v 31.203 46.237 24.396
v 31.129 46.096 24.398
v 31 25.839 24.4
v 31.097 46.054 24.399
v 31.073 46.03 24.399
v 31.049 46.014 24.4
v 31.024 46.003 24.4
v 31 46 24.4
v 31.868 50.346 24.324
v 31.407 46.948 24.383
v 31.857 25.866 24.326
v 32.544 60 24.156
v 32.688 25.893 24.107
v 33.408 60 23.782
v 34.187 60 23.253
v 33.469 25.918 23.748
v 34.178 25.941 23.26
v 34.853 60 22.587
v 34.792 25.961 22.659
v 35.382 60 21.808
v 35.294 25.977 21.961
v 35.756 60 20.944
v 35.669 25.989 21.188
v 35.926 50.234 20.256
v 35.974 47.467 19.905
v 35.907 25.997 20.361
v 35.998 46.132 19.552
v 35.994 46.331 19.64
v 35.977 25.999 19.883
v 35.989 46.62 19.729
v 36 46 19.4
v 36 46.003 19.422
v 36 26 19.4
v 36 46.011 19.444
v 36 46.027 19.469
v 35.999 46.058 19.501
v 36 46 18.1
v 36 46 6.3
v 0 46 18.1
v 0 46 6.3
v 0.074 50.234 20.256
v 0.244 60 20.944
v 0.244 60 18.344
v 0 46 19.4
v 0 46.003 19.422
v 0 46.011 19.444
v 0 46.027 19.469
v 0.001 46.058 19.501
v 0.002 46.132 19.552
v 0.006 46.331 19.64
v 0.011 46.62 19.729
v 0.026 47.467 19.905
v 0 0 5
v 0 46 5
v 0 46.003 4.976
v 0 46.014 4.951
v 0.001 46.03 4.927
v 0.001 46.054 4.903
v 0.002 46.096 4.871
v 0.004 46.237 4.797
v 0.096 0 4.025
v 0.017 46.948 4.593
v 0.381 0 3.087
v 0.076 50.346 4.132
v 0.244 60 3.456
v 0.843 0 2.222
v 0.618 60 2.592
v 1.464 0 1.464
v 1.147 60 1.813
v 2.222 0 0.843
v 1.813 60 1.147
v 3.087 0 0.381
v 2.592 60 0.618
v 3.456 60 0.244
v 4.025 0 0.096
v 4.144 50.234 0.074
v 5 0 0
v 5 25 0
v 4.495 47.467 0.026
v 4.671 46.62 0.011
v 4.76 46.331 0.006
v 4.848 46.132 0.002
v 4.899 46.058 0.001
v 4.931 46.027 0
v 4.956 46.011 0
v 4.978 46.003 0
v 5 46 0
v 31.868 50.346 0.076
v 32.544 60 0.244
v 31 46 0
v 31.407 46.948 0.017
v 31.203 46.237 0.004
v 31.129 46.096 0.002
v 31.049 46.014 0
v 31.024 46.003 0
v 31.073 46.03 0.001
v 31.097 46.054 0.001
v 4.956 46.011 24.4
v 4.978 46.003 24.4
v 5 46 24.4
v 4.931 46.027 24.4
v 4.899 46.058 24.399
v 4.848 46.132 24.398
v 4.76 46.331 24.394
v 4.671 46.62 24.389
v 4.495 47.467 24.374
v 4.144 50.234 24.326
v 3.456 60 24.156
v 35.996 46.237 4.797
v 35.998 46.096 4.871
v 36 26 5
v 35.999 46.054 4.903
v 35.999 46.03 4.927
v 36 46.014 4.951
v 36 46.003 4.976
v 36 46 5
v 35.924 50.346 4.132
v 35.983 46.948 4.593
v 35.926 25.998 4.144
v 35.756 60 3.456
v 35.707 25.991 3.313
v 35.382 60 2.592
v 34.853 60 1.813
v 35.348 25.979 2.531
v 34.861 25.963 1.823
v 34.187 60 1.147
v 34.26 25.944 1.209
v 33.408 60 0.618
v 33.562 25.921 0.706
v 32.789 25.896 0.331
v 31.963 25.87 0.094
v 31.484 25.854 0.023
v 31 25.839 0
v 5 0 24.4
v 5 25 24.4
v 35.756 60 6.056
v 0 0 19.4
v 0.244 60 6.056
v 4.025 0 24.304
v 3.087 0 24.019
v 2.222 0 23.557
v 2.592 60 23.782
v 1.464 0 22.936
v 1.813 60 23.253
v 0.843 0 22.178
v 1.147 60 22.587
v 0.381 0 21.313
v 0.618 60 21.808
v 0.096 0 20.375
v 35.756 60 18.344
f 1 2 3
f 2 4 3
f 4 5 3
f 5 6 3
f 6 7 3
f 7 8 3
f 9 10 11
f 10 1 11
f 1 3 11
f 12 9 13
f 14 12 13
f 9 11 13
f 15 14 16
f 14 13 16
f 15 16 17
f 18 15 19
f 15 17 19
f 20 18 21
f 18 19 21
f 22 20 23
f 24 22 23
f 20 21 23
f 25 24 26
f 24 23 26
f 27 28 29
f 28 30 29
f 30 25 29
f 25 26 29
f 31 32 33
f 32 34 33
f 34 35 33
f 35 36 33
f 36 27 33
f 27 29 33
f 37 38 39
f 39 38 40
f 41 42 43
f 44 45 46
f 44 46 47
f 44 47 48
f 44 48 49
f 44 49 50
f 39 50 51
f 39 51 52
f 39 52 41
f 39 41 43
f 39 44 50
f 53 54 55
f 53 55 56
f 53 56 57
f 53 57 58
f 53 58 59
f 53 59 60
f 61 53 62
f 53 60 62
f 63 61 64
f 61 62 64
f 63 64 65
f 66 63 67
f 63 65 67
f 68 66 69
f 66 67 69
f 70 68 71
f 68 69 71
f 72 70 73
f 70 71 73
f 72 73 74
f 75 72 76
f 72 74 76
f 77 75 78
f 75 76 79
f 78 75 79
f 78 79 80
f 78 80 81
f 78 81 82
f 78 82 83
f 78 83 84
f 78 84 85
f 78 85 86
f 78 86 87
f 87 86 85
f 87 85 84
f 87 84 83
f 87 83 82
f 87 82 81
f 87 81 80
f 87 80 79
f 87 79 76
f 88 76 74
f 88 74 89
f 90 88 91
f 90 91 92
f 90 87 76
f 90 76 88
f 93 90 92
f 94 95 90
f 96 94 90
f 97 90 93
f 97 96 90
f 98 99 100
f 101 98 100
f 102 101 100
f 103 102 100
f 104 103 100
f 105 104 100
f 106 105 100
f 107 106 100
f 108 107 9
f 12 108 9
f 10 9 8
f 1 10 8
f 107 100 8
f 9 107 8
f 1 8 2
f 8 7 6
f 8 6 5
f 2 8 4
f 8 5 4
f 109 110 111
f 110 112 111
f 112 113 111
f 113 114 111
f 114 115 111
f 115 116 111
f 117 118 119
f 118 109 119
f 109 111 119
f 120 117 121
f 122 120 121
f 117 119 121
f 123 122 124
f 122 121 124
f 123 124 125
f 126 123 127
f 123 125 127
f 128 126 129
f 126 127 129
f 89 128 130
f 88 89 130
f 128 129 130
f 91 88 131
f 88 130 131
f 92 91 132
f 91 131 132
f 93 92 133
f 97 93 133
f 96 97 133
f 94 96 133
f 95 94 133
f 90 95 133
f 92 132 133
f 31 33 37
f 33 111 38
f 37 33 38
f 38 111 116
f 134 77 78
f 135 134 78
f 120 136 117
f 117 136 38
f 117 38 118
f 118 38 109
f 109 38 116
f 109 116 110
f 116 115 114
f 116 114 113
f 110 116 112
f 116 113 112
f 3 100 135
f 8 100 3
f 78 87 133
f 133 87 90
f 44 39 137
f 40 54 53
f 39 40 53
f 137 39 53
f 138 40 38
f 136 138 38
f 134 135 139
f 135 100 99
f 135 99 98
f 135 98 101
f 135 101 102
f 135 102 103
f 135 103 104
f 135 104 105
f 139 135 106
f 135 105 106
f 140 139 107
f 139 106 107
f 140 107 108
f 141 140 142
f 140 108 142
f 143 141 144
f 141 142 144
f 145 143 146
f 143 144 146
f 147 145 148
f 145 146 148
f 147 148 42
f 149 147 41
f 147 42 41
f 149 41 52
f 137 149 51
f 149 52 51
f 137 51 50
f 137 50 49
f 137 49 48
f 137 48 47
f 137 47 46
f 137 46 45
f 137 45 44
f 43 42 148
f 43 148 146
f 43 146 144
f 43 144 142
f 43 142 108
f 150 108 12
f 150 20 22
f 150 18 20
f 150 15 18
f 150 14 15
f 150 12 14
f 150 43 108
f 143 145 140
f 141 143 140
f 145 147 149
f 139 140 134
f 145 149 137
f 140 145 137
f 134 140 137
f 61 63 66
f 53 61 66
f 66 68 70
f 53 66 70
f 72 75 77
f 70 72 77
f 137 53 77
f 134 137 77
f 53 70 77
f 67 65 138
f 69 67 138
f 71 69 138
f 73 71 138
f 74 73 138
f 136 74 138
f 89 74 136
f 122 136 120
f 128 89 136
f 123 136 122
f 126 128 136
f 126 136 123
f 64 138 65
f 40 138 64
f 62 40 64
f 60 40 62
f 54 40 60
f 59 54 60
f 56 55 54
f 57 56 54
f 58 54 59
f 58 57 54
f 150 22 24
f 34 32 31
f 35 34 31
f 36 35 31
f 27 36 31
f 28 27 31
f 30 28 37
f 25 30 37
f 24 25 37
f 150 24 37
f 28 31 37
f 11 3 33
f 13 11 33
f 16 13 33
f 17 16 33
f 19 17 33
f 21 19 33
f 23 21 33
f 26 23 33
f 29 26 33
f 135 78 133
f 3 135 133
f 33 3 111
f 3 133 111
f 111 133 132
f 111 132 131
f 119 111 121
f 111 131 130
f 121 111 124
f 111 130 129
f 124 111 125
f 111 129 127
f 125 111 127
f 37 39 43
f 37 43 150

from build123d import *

# Parameters (mm, degrees)
BOSS_EXTRUDE1_DEPTH           = 24.4
SKETCH2_W                     = 36
SKETCH2_H                     = 6.3
BOSS_EXTRUDE2_DEPTH           = 14
BOSS_EXTRUDE2_DRAFT           = 1
BOSS_EXTRUDE2_PROFILE_2_DEPTH = 14
BOSS_EXTRUDE2_PROFILE_2_DRAFT = 1
FILLET1_R                     = 5


with BuildPart() as part:
    # Sketch1 → Boss-Extrude1 (new body)
    with BuildSketch(Plane.XY):
        Polygon((0, 0), (5, 0), (5, 25), (36, 26), (36, 46), (0, 46), align=None)
    extrude(amount=BOSS_EXTRUDE1_DEPTH)


with BuildPart() as boss_extrude2_tool:
    # Sketch2 → Boss-Extrude2 (with draft: the straight prism first)
    with BuildSketch(Plane(origin=(0, 46, 0), x_dir=(1, 0, 0), z_dir=(0, 1, 0))):
        with Locations((18, -3.15)):
            Rectangle(SKETCH2_W, SKETCH2_H)
    extrude(amount=BOSS_EXTRUDE2_DEPTH)
    # Boss-Extrude2: the draft: its side faces are tilted about the plane it starts from
    boss_extrude2_sides = [boss_extrude2_tool.faces().sort_by_distance(p)[0] for p in [
        (0, 53, 3.15),
        (18, 53, 6.3),
        (36, 53, 3.15),
        (18, 53, 0),
    ]]
    draft(boss_extrude2_sides, Plane(origin=(0, 46, 0), x_dir=(1, 0, 0), z_dir=(0, 1, 0)), BOSS_EXTRUDE2_DRAFT)


with BuildPart() as part_1:
    add(part.part)

    # Boss-Extrude2: add boss_extrude2_tool
    add(boss_extrude2_tool.part)


with BuildPart() as boss_extrude2_profile_2_tool:
    # Sketch2 → Boss-Extrude2 profile 2 (with draft: the straight prism first)
    with BuildSketch(Plane(origin=(0, 46, 0), x_dir=(1, 0, 0), z_dir=(0, 1, 0))):
        with Locations((18, -21.25)):
            Rectangle(SKETCH2_W, SKETCH2_H)
    extrude(amount=BOSS_EXTRUDE2_PROFILE_2_DEPTH)
    # Boss-Extrude2 profile 2: the draft: its side faces are tilted about the plane it starts from
    boss_extrude2_profile_2_sides = [boss_extrude2_profile_2_tool.faces().sort_by_distance(p)[0] for p in [
        (18, 53, 24.4),
        (36, 53, 21.25),
        (18, 53, 18.1),
        (0, 53, 21.25),
    ]]
    draft(boss_extrude2_profile_2_sides, Plane(origin=(0, 46, 0), x_dir=(1, 0, 0), z_dir=(0, 1, 0)), BOSS_EXTRUDE2_PROFILE_2_DRAFT)


with BuildPart() as part_2:
    add(part_1.part)

    # Boss-Extrude2 profile 2: add boss_extrude2_profile_2_tool
    add(boss_extrude2_profile_2_tool.part)

    # Fillet1
    # the kernel refuses this fillet: 5 mm, written as the material it takes off along each edge
    with BuildSketch(Plane(origin=(36, -4, 24.4), x_dir=(-1, 0, 0), z_dir=(0, 1, 0))) as fillet1_piece_1:
        with BuildLine():
            CenterArc((FILLET1_R, -FILLET1_R), FILLET1_R, 90, 90)
            Line((0, -FILLET1_R), (-FILLET1_R * 0.02, -FILLET1_R))
            Line((-FILLET1_R * 0.02, -FILLET1_R), (-FILLET1_R * 0.02, FILLET1_R * 0.02))
            Line((-FILLET1_R * 0.02, FILLET1_R * 0.02), (FILLET1_R, FILLET1_R * 0.02))
            Line((FILLET1_R, FILLET1_R * 0.02), (FILLET1_R, 0))
        make_face()
    extrude(amount=80, mode=Mode.SUBTRACT)
    with BuildSketch(Plane(origin=(36, -4, 0), x_dir=(-1, 0, 0), z_dir=(0, 1, 0))) as fillet1_piece_2:
        with BuildLine():
            CenterArc((FILLET1_R, FILLET1_R), FILLET1_R, 180, 90)
            Line((0, FILLET1_R), (-FILLET1_R * 0.02, FILLET1_R))
            Line((-FILLET1_R * 0.02, FILLET1_R), (-FILLET1_R * 0.02, -FILLET1_R * 0.02))
            Line((-FILLET1_R * 0.02, -FILLET1_R * 0.02), (FILLET1_R, -FILLET1_R * 0.02))
            Line((FILLET1_R, -FILLET1_R * 0.02), (FILLET1_R, 0))
        make_face()
    extrude(amount=80, mode=Mode.SUBTRACT)
    with BuildSketch(Plane(origin=(0, 76, 0), x_dir=(0, 0, 1), z_dir=(0, -1, 0))) as fillet1_piece_3:
        with BuildLine():
            CenterArc((FILLET1_R, -FILLET1_R), FILLET1_R, 90, 90)
            Line((0, -FILLET1_R), (-FILLET1_R * 0.02, -FILLET1_R))
            Line((-FILLET1_R * 0.02, -FILLET1_R), (-FILLET1_R * 0.02, FILLET1_R * 0.02))
            Line((-FILLET1_R * 0.02, FILLET1_R * 0.02), (FILLET1_R, FILLET1_R * 0.02))
            Line((FILLET1_R, FILLET1_R * 0.02), (FILLET1_R, 0))
        make_face()
    extrude(amount=106, mode=Mode.SUBTRACT)
    with BuildSketch(Plane(origin=(0, 76, 24.4), x_dir=(0, 0, -1), z_dir=(0, -1, 0))) as fillet1_piece_4:
        with BuildLine():
            CenterArc((FILLET1_R, FILLET1_R), FILLET1_R, 180, 90)
            Line((0, FILLET1_R), (-FILLET1_R * 0.02, FILLET1_R))
            Line((-FILLET1_R * 0.02, FILLET1_R), (-FILLET1_R * 0.02, -FILLET1_R * 0.02))
            Line((-FILLET1_R * 0.02, -FILLET1_R * 0.02), (FILLET1_R, -FILLET1_R * 0.02))
            Line((FILLET1_R, -FILLET1_R * 0.02), (FILLET1_R, 0))
        make_face()
    extrude(amount=106, mode=Mode.SUBTRACT)


solid = part_2.part
